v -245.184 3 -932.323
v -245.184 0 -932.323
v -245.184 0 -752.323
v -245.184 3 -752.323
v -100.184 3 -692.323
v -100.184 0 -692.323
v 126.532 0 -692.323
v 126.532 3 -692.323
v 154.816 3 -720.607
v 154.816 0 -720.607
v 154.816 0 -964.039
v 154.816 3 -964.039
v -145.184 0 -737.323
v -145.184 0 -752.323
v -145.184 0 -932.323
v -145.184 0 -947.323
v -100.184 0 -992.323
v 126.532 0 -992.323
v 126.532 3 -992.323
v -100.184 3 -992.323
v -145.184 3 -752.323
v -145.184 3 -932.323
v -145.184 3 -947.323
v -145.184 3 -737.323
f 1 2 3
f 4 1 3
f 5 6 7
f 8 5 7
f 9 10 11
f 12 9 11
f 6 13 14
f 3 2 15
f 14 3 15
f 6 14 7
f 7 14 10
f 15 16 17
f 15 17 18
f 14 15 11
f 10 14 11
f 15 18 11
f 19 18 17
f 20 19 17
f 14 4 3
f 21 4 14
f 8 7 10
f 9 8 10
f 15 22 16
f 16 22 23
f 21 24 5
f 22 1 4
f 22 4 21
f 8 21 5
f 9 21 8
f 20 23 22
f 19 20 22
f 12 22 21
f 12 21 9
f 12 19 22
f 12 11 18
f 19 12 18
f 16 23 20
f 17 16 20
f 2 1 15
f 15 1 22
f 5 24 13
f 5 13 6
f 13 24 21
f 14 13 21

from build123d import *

# Parameters (mm, degrees)
BOSS_EXTRUDE1_DEPTH = 3
SKETCH3_W           = 102.374795857
SKETCH3_H           = 90.967021537
SKETCH3_W_2         = 153.648776174
SKETCH3_H_2         = 69.94350062
CUT_EXTRUDE2_DEPTH  = 10
CUT_EXTRUDE3_DEPTH  = 60


with BuildPart() as part:
    # Sketch1 → Boss-Extrude1 (new body)
    with BuildSketch(Plane(origin=(0, 0, 0), x_dir=(1, 0, 0), z_dir=(0, 1, 0))):
        Polygon((-245.183632637, 942.323086709), (-245.183632637, 742.323086709), (-145.183632637, 692.323086709), (126.532096115, 692.323086709), (154.816367363, 720.607357957), (154.816367363, 964.038815462), (126.532096115, 992.323086709), (-145.183632637, 992.323086709), align=None)
    extrude(amount=BOSS_EXTRUDE1_DEPTH)

    # Sketch3 → Cut-Extrude2 (cut)
    with BuildSketch(Plane(origin=(0, 3, 0), x_dir=(1, 0, 0), z_dir=(0, 1, 0))):
        with Locations((-196.371030566, 977.806597478)):
            Rectangle(SKETCH3_W, SKETCH3_H)
        with Locations((-222.008020724, 717.351336399)):
            Rectangle(SKETCH3_W_2, SKETCH3_H_2)
    extrude(amount=-CUT_EXTRUDE2_DEPTH, mode=Mode.SUBTRACT)

    # Sketch4 → Cut-Extrude3 (cut)
    with BuildSketch(Plane(origin=(0, 3, 0), x_dir=(1, 0, 0), z_dir=(0, 1, 0))):
        Polygon((-145.183632637, 947.323086709), (-100.183632637, 992.323086709), (-145.183632637, 992.323086709), align=None)
        Polygon((-100.183632637, 692.323086709), (-145.183632637, 692.323086709), (-145.183632637, 737.323086709), align=None)
    extrude(amount=-CUT_EXTRUDE3_DEPTH, mode=Mode.SUBTRACT)


solid = part.part
